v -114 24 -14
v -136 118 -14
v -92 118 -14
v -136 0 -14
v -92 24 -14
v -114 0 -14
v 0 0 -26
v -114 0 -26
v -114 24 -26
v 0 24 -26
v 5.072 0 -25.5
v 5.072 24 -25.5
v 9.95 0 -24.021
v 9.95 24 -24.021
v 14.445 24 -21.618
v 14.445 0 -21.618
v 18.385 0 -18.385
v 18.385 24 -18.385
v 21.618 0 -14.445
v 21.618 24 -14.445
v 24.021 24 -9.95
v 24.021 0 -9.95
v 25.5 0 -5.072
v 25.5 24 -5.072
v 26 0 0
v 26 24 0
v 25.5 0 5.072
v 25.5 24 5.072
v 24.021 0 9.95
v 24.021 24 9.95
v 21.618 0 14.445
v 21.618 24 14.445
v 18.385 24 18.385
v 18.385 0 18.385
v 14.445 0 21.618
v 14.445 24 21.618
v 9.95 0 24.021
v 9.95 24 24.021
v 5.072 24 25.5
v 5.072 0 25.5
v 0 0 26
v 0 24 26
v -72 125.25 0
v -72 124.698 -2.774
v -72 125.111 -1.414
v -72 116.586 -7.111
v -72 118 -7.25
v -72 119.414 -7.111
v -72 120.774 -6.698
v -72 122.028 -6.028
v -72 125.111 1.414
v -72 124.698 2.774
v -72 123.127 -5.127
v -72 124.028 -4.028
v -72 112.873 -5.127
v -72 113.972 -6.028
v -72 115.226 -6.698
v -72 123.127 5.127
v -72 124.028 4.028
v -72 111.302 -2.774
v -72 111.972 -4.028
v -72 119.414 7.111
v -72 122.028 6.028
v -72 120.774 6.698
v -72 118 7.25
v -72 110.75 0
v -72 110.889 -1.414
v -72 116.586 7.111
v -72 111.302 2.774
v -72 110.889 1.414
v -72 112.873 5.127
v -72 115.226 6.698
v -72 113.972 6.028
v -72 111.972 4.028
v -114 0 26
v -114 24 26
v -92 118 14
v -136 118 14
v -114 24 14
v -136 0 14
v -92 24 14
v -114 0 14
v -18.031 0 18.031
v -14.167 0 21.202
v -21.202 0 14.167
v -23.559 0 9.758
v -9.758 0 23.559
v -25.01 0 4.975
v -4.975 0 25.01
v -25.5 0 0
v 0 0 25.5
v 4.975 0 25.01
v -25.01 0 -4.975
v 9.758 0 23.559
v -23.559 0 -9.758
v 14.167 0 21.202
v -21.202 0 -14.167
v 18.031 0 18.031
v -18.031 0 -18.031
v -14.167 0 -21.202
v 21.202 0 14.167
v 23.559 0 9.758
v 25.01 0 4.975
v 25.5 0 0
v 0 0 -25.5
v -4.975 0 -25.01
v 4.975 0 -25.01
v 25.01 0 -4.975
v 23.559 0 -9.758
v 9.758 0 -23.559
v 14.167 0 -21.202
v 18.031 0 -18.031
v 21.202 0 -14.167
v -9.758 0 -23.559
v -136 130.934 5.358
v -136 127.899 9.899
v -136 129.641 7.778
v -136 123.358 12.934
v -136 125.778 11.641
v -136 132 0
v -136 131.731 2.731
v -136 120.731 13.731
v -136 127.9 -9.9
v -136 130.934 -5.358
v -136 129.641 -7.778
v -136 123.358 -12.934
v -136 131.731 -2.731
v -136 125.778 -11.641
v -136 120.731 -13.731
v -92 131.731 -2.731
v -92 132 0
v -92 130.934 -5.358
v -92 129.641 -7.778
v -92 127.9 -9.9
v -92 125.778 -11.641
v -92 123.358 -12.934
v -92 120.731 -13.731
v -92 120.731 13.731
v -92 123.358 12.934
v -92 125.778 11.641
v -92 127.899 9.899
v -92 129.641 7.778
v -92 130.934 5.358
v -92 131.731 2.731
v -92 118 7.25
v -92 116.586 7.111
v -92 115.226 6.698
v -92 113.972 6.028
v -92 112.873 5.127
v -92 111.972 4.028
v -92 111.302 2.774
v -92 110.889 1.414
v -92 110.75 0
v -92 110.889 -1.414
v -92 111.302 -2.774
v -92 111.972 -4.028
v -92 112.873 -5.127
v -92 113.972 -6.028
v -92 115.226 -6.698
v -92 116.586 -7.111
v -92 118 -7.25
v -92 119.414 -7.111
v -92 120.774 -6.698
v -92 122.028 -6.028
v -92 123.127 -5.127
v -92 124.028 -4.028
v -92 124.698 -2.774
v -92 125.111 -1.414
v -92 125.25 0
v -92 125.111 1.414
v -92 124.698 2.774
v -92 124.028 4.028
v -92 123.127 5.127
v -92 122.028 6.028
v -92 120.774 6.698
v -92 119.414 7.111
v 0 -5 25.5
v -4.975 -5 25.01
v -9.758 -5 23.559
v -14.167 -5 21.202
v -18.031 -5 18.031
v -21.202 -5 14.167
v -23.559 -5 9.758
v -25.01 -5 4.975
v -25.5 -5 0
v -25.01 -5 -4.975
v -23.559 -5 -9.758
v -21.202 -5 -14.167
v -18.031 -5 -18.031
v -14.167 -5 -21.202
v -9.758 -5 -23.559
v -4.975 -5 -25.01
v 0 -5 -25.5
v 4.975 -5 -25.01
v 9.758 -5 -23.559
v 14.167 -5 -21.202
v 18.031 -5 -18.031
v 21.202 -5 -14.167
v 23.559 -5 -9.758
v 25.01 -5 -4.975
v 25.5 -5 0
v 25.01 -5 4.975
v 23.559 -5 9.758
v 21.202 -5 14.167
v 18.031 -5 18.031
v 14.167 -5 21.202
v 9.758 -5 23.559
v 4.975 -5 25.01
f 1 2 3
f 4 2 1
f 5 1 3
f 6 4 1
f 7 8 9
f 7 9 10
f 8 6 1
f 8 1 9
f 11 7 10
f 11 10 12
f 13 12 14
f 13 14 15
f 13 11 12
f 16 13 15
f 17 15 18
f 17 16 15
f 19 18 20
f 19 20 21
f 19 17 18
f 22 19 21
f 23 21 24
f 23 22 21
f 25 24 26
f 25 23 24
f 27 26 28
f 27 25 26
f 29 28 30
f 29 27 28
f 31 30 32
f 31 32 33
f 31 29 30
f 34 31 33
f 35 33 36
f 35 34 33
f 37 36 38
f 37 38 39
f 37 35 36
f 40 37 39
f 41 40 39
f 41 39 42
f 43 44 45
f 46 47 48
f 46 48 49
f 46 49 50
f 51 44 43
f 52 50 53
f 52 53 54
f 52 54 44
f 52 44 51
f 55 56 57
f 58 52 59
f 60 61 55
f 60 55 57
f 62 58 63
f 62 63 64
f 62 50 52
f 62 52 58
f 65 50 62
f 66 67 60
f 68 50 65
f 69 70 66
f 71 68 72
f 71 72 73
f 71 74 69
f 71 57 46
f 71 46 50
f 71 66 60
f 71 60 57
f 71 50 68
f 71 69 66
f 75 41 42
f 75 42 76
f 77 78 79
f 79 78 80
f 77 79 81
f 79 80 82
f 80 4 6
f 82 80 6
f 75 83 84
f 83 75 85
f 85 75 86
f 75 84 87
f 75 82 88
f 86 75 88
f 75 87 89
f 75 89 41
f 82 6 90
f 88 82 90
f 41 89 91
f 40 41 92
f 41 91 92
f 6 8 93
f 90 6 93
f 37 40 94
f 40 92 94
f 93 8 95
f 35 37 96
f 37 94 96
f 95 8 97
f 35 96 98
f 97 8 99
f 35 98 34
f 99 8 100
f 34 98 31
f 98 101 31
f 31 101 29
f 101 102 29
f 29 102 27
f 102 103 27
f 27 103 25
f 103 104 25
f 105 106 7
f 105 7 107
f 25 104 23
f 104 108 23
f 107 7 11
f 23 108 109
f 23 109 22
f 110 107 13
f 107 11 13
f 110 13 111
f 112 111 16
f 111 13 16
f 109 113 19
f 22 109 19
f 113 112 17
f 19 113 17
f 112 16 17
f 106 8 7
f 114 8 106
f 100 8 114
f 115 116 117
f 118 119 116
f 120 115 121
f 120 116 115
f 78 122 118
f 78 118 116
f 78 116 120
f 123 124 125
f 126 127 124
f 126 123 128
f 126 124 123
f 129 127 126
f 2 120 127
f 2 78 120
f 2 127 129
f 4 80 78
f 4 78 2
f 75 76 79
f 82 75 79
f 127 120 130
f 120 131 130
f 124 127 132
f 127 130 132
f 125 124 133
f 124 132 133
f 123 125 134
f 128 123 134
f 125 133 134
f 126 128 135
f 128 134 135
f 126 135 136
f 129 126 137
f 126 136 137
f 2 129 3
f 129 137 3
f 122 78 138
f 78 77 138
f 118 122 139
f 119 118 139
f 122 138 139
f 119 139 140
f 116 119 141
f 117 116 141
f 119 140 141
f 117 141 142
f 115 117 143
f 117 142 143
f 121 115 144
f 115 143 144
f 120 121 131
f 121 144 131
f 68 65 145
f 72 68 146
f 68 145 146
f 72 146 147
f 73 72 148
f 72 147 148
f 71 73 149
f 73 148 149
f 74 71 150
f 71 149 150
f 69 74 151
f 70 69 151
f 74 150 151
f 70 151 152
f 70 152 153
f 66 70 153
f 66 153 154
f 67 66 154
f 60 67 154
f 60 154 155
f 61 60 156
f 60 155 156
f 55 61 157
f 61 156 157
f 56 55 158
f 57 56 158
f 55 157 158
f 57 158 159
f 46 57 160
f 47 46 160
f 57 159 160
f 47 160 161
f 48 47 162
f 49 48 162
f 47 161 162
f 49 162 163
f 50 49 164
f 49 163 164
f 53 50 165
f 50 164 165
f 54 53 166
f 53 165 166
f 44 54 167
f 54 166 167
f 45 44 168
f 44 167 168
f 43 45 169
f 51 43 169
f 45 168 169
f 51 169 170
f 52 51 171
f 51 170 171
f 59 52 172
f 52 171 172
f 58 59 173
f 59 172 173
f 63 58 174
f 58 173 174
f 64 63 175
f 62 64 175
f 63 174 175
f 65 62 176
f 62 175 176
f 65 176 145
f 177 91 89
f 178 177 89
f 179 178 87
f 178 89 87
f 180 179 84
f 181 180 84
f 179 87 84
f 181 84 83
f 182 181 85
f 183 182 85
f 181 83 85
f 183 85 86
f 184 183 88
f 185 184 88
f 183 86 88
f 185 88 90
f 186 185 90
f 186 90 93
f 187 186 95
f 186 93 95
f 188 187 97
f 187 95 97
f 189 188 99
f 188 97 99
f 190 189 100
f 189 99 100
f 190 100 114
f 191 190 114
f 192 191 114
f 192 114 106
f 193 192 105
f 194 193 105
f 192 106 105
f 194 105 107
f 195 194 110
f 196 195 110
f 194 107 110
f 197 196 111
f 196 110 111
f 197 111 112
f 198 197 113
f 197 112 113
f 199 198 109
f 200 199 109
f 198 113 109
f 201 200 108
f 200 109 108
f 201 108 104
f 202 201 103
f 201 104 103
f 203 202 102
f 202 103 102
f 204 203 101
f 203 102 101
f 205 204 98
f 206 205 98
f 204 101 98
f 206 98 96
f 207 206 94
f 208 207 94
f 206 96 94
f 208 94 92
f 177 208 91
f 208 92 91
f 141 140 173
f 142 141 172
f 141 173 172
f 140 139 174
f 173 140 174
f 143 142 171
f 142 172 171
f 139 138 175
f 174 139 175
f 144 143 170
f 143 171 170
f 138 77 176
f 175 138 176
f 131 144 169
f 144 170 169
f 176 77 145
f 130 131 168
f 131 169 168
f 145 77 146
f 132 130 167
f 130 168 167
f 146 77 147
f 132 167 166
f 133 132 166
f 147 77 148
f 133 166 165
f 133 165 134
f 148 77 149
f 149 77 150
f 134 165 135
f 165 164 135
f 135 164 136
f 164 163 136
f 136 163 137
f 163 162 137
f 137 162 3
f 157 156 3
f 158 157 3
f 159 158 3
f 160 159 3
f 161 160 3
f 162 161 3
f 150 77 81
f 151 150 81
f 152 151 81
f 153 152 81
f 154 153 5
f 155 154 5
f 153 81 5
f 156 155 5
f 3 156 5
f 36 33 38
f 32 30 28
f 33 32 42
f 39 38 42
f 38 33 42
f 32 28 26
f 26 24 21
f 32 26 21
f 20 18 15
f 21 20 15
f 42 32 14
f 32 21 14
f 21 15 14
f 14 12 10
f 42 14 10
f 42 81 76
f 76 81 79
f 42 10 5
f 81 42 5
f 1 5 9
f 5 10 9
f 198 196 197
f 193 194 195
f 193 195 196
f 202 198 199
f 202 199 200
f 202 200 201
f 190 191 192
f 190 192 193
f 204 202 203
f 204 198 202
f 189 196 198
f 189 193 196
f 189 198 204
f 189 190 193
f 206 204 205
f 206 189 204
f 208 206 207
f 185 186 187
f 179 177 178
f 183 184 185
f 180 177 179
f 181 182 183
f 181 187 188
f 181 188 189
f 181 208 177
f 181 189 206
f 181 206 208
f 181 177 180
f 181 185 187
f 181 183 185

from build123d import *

# Parameters (mm, degrees)
BOSS_EXTRUDE2_DEPTH = 24
SKETCH2_R           = 25.5
BOSS_EXTRUDE3_DEPTH = 5
SKETCH3_W           = 44
SKETCH3_H           = 28
BOSS_EXTRUDE4_DEPTH = 132
FILLET2_R           = 14
FILLET5_R           = 14
SKETCH4_R           = 7.25
BOSS_EXTRUDE5_DEPTH = 20


with BuildPart() as part:
    # Sketch1 → Boss-Extrude2 (new body)
    with BuildSketch(Plane(origin=(0, 0, 0), x_dir=(1, 0, 0), z_dir=(0, 1, 0))):
        with BuildLine():
            Line((-114, 26), (0, 26))
            ThreePointArc((0, 26), (26, 0), (0, -26))
            Line((0, -26), (-114, -26))
            Line((-114, -26), (-114, 26))
        make_face()
    extrude(amount=BOSS_EXTRUDE2_DEPTH)

    # Sketch2 → Boss-Extrude3 (add)
    with BuildSketch(Plane.XZ):
        with Locations(Location((0, 0, 0), (0, 0, 90))):
            Circle(SKETCH2_R)
    extrude(amount=BOSS_EXTRUDE3_DEPTH)

    # Sketch3 → Boss-Extrude4 (add)
    with BuildSketch(Plane(origin=(0, 0, 0), x_dir=(1, 0, 0), z_dir=(0, 1, 0))):
        with Locations((-114, 0)):
            Rectangle(SKETCH3_W, SKETCH3_H)
    extrude(amount=BOSS_EXTRUDE4_DEPTH)

    # Fillet2
    fillet2_edges = [part.edges().sort_by_distance(p)[0] for p in [
        (-114, 132, 14),
    ]]
    fillet(fillet2_edges, radius=FILLET2_R)

    # Fillet5
    fillet5_edges = [part.edges().sort_by_distance(p)[0] for p in [
        (-114, 132, -14),
    ]]
    fillet(fillet5_edges, radius=FILLET5_R - 0.0001)  # a hair under: the kernel refuses the full size

    # Sketch4 → Boss-Extrude5 (add)
    with BuildSketch(Plane(origin=(-92, 0, 0), x_dir=(0, 0, -1), z_dir=(1, 0, 0))):
        with Locations(Location((0, 118, 0), (0, 0, 180))):
            Circle(SKETCH4_R)
    extrude(amount=BOSS_EXTRUDE5_DEPTH)


solid = part.part
